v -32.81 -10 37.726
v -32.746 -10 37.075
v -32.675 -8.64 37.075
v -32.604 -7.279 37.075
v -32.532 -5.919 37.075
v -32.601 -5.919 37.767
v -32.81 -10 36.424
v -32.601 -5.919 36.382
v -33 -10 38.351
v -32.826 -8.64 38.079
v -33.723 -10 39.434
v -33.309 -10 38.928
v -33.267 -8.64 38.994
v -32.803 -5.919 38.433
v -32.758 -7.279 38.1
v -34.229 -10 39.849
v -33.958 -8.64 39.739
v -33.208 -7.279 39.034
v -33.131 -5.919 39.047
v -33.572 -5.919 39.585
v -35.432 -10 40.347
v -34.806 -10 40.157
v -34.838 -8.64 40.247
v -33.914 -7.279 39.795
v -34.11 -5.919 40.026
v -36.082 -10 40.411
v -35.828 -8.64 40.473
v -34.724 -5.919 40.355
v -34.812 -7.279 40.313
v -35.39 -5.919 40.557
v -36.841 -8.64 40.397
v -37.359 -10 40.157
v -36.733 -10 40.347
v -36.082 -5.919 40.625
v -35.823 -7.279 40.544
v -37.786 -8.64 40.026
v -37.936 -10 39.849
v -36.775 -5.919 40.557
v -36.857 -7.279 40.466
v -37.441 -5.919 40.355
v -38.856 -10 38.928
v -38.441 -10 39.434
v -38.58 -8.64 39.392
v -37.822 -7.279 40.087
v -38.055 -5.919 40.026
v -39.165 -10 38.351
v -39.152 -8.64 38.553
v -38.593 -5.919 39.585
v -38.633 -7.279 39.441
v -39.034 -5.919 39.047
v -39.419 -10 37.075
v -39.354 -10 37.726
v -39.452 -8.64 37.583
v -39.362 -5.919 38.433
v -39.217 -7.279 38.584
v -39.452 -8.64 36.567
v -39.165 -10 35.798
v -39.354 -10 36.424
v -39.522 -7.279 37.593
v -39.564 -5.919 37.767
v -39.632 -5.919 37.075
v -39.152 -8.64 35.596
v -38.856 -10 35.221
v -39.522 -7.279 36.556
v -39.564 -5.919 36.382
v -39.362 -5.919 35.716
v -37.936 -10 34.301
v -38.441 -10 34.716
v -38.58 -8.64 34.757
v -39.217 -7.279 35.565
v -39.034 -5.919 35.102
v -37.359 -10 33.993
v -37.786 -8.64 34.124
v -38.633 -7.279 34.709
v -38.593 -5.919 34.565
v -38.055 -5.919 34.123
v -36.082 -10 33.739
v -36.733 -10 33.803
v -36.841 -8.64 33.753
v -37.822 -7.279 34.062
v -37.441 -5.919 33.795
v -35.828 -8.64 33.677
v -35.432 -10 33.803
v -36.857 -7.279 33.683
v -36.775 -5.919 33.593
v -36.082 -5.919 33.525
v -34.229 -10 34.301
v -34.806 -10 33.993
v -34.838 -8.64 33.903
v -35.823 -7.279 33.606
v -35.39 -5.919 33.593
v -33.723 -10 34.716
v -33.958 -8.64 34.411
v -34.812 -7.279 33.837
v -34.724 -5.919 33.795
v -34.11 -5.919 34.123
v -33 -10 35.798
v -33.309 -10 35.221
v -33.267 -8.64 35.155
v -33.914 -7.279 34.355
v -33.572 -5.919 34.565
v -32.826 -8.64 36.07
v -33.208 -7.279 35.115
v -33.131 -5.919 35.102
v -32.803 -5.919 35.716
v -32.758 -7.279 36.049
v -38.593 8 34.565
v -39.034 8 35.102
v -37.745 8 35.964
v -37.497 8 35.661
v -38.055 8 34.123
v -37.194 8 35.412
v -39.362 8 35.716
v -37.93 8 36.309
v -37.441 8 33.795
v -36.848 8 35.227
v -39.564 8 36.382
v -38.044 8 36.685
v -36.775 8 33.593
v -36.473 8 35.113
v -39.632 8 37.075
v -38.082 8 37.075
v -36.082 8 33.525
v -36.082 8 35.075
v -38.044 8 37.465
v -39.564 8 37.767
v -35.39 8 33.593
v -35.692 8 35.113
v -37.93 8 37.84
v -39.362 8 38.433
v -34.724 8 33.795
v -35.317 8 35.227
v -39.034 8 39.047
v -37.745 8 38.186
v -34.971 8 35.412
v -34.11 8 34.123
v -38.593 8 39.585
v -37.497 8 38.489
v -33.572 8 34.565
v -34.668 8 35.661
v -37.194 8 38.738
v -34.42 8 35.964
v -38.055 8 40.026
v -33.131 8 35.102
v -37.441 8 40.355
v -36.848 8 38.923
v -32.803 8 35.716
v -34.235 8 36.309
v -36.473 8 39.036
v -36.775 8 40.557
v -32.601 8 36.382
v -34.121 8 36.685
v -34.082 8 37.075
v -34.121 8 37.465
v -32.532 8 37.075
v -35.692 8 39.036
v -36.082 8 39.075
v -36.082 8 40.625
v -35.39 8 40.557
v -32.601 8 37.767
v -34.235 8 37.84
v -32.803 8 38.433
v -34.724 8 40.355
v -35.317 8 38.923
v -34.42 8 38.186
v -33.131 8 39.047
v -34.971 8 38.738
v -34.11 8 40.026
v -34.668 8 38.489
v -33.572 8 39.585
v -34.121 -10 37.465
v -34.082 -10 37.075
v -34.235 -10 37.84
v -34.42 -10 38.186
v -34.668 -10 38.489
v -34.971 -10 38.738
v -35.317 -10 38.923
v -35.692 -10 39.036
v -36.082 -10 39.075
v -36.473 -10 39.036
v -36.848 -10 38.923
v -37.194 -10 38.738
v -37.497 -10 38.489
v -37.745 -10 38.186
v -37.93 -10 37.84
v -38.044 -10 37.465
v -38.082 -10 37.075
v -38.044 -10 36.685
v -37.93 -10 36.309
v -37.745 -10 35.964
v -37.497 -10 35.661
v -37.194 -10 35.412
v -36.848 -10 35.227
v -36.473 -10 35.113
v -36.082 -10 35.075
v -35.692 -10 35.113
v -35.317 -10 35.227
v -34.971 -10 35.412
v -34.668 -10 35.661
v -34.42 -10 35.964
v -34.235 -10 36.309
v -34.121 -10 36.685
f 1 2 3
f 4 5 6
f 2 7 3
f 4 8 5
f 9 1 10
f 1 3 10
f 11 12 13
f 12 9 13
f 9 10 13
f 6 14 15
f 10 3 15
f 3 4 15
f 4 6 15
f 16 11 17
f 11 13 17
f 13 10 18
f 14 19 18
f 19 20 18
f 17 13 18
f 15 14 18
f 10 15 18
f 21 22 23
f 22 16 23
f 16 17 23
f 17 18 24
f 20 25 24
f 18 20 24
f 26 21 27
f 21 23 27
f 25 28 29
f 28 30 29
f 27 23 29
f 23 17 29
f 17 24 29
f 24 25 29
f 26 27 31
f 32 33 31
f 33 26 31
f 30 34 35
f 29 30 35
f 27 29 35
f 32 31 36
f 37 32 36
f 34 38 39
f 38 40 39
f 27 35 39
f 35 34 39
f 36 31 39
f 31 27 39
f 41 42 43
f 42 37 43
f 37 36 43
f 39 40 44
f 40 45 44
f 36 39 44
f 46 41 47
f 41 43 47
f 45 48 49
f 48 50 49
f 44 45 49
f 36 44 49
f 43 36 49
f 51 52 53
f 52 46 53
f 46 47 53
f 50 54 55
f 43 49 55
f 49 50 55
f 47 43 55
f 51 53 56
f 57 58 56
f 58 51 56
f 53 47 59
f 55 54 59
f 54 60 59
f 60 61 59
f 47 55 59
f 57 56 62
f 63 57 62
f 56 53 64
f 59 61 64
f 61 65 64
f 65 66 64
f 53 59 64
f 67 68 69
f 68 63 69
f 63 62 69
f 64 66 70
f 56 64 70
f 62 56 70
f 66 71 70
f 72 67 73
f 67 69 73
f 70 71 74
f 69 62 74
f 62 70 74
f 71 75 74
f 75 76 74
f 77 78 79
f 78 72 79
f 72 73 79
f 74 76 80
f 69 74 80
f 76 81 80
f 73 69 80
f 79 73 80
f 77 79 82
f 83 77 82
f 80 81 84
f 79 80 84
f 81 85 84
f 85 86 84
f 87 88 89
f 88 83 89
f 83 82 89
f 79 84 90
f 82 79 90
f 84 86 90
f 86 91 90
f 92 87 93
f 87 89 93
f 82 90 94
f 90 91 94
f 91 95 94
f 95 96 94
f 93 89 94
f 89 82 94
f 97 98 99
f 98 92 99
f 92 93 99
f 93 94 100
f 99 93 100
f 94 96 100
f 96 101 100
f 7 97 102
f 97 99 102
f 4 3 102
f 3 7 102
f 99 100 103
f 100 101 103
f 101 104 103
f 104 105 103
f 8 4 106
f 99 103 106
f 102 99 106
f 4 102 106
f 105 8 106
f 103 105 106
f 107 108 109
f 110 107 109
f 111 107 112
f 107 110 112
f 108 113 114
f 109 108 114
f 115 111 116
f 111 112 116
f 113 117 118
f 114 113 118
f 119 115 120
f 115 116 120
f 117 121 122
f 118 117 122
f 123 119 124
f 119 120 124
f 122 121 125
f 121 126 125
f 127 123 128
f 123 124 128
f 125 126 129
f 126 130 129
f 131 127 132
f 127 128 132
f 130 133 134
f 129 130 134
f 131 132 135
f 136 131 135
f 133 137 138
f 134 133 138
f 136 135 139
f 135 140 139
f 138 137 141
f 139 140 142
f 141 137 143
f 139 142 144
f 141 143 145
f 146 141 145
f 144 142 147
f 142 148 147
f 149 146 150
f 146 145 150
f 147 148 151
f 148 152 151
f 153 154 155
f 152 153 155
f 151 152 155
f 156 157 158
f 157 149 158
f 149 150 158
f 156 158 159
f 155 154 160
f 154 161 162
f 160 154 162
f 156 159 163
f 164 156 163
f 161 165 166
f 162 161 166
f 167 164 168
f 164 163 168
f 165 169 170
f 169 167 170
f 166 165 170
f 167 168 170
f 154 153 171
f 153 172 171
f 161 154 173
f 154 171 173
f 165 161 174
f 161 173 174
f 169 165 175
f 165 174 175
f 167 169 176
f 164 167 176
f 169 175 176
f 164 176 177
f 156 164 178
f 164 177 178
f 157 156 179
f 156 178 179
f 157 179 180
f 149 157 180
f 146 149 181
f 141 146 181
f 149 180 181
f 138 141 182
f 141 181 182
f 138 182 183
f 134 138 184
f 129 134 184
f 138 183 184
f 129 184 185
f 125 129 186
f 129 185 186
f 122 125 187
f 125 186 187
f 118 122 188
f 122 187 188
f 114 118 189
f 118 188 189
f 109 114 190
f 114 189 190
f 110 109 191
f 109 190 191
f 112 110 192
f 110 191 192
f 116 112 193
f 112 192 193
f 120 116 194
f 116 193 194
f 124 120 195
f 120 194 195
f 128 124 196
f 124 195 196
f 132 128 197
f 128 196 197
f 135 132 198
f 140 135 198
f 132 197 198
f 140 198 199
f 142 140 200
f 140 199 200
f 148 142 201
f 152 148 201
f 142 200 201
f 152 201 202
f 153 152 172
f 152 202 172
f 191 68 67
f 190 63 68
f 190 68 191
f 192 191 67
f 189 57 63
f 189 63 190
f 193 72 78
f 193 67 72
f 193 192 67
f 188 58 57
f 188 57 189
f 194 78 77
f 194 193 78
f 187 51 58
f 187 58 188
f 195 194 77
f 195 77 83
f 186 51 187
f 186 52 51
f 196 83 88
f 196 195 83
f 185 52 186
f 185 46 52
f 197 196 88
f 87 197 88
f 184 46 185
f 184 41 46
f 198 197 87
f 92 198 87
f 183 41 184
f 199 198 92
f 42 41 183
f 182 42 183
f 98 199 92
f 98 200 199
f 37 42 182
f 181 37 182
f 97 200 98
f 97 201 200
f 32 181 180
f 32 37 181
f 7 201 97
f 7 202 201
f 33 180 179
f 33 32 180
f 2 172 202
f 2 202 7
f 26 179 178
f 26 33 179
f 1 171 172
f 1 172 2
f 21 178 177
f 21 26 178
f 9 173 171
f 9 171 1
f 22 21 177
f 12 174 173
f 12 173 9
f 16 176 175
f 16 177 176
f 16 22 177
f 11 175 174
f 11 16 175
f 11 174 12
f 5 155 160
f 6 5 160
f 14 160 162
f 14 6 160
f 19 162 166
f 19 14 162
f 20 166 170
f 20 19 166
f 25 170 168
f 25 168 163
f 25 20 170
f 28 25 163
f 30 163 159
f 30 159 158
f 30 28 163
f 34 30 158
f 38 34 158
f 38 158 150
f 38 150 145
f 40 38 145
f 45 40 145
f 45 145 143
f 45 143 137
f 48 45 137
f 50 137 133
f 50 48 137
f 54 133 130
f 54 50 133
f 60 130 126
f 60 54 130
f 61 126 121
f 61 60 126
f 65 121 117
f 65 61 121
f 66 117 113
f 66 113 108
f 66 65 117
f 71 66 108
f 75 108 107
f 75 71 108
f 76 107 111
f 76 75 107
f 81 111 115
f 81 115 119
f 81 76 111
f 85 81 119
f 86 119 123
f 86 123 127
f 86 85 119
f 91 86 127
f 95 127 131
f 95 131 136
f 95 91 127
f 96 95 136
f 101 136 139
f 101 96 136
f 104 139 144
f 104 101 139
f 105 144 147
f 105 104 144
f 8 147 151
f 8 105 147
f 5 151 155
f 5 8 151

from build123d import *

# Parameters (mm, degrees)
F0_R     = 3.55
F1_DEPTH = 25
F2_SIZE2 = 19.0811366877
F2_SIZE  = 1
F3_R     = 4.5061105162
F4_DEPTH = 15
F5_R     = 2
F6_DEPTH = 25
F7_DEPTH = 8


with BuildPart() as f1:
    # F0 (on Front) → F1 (new body)
    with BuildSketch(Plane.XZ):
        with Locations((-36.0824763775, 37.0747447014)):
            Circle(F0_R)
    extrude(amount=F1_DEPTH)

    # F2
    f2_edges = [f1.edges().sort_by_distance(p)[0] for p in [
        (-39.632476, -25, 37.074745),
    ]]
    f2_side = f1.faces().sort_by_distance((-36.082476, -25, 37.074745))[0]
    chamfer(f2_edges, length=F2_SIZE, length2=F2_SIZE2, reference=f2_side)

    # F3 (on face) → F4 (cut)
    with BuildSketch(Plane.XZ.offset(25)):
        with Locations((-36.0824763775, 37.0747447014)):
            Circle(F3_R)
    extrude(amount=-F4_DEPTH, mode=Mode.SUBTRACT)

    # F5 (on face) → F6 (cut)
    with BuildSketch(Plane.XZ.offset(10)):
        with Locations((-36.0824763775, 37.0747447014)):
            Circle(F5_R)
    extrude(amount=-F6_DEPTH, mode=Mode.SUBTRACT)

    # F7 (add): a face of the model
    f7_faces = [f1.faces().sort_by_distance(p)[0] for p in [
        (-39.5320672146, 0, 37.0747447014),
    ]]
    extrude(f7_faces, amount=F7_DEPTH)


solid = f1.part
